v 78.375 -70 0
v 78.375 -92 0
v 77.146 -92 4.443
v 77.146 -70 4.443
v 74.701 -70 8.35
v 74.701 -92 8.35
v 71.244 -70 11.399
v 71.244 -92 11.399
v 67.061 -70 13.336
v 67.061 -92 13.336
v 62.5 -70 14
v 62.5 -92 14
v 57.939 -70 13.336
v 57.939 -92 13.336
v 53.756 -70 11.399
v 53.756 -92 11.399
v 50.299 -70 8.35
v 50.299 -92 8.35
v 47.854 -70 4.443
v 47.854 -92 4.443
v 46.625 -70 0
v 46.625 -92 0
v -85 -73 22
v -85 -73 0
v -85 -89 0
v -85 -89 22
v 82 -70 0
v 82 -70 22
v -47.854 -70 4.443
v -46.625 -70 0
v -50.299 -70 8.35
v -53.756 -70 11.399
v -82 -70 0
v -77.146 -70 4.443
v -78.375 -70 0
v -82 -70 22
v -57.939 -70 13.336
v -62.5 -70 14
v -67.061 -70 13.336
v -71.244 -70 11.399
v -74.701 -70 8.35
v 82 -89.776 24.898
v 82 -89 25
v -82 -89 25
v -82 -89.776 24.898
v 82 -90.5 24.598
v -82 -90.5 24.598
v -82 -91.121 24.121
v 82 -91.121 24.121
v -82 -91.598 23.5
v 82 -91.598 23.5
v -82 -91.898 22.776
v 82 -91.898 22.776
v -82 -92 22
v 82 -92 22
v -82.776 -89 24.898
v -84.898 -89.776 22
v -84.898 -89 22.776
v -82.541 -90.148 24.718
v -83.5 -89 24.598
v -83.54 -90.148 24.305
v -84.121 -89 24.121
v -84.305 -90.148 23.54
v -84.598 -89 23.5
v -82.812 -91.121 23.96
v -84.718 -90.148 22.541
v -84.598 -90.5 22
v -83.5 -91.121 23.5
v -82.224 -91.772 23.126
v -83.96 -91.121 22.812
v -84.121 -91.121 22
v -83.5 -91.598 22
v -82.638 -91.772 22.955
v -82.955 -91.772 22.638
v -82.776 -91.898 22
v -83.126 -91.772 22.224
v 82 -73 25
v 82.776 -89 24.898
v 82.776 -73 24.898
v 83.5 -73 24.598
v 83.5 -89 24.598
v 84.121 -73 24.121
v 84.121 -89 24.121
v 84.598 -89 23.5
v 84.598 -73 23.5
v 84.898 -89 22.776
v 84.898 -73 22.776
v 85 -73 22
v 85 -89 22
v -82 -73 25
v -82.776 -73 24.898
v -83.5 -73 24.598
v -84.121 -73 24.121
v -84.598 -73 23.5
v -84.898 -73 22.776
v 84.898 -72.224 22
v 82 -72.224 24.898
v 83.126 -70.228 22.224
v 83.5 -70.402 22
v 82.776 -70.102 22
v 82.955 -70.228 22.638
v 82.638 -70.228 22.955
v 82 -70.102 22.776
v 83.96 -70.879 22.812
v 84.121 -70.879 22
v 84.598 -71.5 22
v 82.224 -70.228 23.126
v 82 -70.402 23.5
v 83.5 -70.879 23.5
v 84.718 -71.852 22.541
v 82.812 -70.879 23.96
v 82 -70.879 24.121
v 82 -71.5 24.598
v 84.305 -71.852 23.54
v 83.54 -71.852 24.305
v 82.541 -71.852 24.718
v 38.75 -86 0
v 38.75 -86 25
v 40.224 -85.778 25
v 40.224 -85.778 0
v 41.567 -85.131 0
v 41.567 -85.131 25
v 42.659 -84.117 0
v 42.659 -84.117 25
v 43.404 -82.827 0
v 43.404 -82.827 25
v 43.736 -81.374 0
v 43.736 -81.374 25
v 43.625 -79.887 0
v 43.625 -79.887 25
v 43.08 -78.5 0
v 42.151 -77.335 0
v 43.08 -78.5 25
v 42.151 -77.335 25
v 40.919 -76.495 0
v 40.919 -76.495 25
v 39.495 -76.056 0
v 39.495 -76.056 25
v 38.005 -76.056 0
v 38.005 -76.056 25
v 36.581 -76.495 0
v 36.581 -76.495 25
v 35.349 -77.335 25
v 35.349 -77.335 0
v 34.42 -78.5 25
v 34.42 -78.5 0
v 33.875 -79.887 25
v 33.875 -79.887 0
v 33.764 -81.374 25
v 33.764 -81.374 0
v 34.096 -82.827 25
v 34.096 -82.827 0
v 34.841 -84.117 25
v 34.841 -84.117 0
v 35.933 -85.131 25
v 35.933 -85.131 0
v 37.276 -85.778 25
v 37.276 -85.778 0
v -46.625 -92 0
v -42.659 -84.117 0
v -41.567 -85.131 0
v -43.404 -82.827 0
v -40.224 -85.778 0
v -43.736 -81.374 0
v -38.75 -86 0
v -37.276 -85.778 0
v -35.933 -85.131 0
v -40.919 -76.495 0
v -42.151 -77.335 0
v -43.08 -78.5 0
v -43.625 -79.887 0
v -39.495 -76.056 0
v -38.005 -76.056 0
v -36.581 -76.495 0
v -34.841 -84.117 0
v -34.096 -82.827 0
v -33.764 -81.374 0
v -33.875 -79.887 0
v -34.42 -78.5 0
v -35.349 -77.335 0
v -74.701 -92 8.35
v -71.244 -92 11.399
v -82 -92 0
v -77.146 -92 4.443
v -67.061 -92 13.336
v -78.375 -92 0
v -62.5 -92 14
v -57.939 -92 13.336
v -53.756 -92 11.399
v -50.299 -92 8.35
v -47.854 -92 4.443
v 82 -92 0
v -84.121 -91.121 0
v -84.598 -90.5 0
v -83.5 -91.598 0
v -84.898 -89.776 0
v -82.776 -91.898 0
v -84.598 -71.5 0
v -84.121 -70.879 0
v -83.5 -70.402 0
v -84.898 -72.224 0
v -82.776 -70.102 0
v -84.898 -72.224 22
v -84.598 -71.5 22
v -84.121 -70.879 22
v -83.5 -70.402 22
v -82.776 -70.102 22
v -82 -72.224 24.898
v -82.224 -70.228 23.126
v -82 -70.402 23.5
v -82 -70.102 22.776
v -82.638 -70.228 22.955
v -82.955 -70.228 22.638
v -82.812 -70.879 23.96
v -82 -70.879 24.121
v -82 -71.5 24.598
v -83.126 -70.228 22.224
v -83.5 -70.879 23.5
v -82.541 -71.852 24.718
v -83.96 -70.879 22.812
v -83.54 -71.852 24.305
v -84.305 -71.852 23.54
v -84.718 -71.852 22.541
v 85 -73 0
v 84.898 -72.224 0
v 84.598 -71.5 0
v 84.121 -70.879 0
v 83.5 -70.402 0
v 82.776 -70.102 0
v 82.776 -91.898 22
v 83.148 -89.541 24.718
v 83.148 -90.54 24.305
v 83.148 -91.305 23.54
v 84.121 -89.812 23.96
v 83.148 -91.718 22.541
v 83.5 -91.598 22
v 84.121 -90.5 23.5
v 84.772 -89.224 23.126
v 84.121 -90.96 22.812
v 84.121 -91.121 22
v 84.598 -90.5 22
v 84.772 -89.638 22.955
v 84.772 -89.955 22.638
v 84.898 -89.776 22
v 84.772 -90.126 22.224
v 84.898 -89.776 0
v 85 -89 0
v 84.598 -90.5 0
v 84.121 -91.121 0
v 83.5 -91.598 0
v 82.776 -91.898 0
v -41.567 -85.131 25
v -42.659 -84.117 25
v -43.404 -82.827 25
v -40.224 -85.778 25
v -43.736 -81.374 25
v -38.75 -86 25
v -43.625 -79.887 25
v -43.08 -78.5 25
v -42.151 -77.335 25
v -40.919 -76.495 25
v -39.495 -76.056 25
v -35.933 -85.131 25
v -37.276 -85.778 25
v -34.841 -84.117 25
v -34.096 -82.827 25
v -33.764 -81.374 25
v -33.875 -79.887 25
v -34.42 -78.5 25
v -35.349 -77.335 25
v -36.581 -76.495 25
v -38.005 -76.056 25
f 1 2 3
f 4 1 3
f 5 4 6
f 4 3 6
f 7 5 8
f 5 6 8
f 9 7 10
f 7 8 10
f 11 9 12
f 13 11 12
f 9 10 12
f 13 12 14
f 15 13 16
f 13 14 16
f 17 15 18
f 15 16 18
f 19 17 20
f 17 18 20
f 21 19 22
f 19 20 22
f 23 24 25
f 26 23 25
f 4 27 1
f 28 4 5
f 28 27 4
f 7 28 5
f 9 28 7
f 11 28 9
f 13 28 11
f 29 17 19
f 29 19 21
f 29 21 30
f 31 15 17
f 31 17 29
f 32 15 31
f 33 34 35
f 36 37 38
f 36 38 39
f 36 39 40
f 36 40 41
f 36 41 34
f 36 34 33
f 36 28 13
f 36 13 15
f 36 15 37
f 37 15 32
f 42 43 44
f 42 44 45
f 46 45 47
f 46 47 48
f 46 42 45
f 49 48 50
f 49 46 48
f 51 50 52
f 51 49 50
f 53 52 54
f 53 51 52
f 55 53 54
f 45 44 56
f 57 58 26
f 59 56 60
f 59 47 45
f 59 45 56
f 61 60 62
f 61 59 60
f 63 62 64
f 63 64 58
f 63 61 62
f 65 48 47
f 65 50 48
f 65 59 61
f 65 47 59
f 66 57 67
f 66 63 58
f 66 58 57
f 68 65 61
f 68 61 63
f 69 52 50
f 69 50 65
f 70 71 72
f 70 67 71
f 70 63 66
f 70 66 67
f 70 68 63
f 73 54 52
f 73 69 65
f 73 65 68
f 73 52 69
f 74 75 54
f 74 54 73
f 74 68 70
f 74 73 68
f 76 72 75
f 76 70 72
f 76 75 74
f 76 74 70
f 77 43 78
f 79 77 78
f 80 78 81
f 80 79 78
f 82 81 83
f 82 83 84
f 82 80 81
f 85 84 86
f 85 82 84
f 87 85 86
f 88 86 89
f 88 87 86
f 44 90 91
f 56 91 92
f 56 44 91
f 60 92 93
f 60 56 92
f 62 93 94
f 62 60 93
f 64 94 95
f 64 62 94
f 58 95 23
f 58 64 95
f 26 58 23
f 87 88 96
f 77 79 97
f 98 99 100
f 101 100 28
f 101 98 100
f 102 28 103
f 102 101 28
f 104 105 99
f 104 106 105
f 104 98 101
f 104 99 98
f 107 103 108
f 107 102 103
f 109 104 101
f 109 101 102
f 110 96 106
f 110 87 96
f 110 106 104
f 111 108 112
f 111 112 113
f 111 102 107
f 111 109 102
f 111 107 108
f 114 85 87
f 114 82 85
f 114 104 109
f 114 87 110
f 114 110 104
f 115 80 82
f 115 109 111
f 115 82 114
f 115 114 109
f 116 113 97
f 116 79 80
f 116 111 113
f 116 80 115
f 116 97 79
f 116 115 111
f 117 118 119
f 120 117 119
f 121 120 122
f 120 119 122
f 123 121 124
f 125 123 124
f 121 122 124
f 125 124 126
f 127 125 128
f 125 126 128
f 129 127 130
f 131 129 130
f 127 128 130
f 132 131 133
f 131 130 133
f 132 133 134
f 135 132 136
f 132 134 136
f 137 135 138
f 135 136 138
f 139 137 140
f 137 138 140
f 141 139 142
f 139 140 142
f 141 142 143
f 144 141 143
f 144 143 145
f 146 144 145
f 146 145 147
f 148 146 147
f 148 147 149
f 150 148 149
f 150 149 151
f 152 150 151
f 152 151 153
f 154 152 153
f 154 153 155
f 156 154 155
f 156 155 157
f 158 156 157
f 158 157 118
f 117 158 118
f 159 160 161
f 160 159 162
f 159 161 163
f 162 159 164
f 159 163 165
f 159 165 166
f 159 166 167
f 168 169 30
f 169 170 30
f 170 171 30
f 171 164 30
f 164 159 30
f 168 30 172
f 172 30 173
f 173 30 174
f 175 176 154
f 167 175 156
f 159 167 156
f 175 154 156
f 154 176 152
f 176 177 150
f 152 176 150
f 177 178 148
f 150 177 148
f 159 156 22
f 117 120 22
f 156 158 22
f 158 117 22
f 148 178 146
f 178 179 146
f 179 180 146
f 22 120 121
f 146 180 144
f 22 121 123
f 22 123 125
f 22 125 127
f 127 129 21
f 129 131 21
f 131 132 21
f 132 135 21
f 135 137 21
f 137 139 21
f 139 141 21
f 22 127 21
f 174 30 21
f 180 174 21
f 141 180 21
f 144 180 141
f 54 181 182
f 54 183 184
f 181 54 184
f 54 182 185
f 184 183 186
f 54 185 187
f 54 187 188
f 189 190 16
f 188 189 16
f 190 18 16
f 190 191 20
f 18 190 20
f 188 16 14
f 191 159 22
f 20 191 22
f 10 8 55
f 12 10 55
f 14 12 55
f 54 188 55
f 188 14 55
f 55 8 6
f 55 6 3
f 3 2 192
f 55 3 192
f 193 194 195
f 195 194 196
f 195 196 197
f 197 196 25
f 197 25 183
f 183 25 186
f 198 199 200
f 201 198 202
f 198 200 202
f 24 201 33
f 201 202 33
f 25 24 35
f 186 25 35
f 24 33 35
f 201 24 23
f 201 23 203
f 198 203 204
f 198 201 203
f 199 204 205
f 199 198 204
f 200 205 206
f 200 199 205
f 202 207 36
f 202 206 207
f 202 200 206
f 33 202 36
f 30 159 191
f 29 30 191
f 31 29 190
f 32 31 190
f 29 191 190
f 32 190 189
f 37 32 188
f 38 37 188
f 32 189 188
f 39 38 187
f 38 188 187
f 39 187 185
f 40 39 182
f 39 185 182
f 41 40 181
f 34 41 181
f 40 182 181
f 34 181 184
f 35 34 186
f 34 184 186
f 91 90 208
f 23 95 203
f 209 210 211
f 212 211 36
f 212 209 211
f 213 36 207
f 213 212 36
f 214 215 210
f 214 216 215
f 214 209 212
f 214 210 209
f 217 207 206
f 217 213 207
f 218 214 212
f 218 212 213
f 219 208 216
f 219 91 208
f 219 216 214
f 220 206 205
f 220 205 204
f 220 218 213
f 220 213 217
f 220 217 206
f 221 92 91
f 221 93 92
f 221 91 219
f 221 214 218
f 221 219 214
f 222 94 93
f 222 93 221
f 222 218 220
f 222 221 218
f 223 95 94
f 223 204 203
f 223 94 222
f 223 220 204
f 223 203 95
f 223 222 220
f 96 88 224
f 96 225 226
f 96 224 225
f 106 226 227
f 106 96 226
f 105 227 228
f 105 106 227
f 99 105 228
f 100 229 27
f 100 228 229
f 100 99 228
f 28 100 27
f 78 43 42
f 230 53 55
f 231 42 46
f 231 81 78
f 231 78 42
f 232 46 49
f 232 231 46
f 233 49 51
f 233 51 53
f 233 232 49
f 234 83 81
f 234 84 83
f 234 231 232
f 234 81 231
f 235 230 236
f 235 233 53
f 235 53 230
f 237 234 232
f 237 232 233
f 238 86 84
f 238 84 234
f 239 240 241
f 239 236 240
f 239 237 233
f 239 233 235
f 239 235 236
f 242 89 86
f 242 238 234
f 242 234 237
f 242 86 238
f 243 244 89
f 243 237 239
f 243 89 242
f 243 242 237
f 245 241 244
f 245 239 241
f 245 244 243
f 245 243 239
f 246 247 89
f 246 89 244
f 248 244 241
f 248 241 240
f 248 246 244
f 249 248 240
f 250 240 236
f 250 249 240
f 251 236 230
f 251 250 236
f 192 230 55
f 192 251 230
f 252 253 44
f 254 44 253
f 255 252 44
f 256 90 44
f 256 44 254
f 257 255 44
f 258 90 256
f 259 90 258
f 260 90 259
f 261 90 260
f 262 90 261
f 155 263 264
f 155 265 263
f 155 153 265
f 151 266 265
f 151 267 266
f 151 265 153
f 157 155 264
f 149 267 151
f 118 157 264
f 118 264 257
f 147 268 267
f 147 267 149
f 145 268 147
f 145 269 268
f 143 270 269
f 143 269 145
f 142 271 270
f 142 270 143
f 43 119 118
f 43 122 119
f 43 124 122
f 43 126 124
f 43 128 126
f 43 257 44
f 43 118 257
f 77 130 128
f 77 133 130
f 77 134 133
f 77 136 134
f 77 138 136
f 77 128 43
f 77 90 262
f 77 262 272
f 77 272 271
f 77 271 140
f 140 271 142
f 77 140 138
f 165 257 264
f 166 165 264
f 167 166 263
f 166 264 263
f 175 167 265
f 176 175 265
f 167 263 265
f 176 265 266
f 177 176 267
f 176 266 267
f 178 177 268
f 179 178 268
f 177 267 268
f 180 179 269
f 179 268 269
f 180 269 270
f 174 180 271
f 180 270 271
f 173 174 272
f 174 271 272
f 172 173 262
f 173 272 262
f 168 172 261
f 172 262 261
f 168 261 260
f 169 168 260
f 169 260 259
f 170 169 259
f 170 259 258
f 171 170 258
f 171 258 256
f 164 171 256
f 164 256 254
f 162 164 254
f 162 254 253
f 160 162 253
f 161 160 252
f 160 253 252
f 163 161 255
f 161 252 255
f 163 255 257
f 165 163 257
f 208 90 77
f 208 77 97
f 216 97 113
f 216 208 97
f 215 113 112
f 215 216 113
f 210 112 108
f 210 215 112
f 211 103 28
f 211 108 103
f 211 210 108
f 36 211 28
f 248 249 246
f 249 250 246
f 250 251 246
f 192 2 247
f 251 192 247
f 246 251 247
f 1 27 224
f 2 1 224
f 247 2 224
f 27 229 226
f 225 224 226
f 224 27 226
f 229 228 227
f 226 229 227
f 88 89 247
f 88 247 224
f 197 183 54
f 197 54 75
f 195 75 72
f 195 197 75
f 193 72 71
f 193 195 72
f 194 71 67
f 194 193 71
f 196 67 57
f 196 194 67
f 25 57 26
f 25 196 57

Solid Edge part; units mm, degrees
sketch "Sketch1" plane through (0, 0, 0) normal (0, 0, 1) x (1, 0, 0)
  line L0 (-85, -92) -> (85, -92)
  line L1 (85, -92) -> (85, 92)
  line L2 (85, 92) -> (-85, 92)
  line L3 (-85, 92) -> (-85, -92)
  dimension "D1" = 184
  dimension "D2" = 170
extrude "Protrusion1" add sketch "Sketch1" along normal blind 25
sketch "Sketch2" plane through (0, -92, 12.5) normal (0, -1, 0) x (1, 0, 0)
  circle A0 centre (-62.5, -14.5) radius 16
  circle A1 centre (62.5, -14.5) radius 16
  dimension "D1" = 22.5
  dimension "D2" = 2
  dimension "D3" = 22.5
  dimension "D4" = 2
  dimension "D5" = 32
  dimension "D6" = 32
extrude "Cutout1" cut sketch "Sketch2" along normal mid plane 529.2958
sketch "Sketch3" plane through (0, 0, 25) normal (0, 0, 1) x (0, -1, 0)
  circle A0 centre (81, 38.75) radius 5
  circle A1 centre (-81, 38.75) radius 5
  circle A2 centre (-81, -38.75) radius 5
  circle A3 centre (81, -38.75) radius 5
  dimension "D1" = 77.5
  dimension "D2" = 77.5
  dimension "D3" = 162
  dimension "D4" = 11
  dimension "D5" = 46.25
  dimension "D6" = 11
  dimension "D7" = 46.25
  dimension "D8" = 46.25
extrude "ExtrudedCutout_2" cut sketch "Sketch3" along normal mid plane 360.8334
fillet "Round_1" radius 3 4 edges at (0, 92, 25) (85, 0, 25) (0, -92, 25) (-85, 0, 25)
sketch "Sketch4" plane through (0, 0, 0) normal (0, 0, -1) x (-1, 0, 0)
  line L0 (-108.1333, -70) -> (102.1809, -70)
  line L1 (102.1809, -70) -> (102.1809, 115.1165)
  line L2 (102.1809, 115.1165) -> (-108.1333, 115.1165)
  line L3 (-108.1333, 115.1165) -> (-108.1333, -70)
extrude "Cutout2" cut sketch "Sketch4" along normal mid plane 462.6347
fillet "Round_2" radius 3 4 edges at (0, -70, 25) (-84.1213, -70, 24.1213) (-85, -70, 11) (85, -70, 11)
fillet "Round1" radius 3 4 edges at (85, -92, 11) (84.1213, -91.1213, 24.1213) (-85, -92, 11) (-84.1213, -91.1213, 24.1213)
properties material "Aluminum, 6061-T6"
